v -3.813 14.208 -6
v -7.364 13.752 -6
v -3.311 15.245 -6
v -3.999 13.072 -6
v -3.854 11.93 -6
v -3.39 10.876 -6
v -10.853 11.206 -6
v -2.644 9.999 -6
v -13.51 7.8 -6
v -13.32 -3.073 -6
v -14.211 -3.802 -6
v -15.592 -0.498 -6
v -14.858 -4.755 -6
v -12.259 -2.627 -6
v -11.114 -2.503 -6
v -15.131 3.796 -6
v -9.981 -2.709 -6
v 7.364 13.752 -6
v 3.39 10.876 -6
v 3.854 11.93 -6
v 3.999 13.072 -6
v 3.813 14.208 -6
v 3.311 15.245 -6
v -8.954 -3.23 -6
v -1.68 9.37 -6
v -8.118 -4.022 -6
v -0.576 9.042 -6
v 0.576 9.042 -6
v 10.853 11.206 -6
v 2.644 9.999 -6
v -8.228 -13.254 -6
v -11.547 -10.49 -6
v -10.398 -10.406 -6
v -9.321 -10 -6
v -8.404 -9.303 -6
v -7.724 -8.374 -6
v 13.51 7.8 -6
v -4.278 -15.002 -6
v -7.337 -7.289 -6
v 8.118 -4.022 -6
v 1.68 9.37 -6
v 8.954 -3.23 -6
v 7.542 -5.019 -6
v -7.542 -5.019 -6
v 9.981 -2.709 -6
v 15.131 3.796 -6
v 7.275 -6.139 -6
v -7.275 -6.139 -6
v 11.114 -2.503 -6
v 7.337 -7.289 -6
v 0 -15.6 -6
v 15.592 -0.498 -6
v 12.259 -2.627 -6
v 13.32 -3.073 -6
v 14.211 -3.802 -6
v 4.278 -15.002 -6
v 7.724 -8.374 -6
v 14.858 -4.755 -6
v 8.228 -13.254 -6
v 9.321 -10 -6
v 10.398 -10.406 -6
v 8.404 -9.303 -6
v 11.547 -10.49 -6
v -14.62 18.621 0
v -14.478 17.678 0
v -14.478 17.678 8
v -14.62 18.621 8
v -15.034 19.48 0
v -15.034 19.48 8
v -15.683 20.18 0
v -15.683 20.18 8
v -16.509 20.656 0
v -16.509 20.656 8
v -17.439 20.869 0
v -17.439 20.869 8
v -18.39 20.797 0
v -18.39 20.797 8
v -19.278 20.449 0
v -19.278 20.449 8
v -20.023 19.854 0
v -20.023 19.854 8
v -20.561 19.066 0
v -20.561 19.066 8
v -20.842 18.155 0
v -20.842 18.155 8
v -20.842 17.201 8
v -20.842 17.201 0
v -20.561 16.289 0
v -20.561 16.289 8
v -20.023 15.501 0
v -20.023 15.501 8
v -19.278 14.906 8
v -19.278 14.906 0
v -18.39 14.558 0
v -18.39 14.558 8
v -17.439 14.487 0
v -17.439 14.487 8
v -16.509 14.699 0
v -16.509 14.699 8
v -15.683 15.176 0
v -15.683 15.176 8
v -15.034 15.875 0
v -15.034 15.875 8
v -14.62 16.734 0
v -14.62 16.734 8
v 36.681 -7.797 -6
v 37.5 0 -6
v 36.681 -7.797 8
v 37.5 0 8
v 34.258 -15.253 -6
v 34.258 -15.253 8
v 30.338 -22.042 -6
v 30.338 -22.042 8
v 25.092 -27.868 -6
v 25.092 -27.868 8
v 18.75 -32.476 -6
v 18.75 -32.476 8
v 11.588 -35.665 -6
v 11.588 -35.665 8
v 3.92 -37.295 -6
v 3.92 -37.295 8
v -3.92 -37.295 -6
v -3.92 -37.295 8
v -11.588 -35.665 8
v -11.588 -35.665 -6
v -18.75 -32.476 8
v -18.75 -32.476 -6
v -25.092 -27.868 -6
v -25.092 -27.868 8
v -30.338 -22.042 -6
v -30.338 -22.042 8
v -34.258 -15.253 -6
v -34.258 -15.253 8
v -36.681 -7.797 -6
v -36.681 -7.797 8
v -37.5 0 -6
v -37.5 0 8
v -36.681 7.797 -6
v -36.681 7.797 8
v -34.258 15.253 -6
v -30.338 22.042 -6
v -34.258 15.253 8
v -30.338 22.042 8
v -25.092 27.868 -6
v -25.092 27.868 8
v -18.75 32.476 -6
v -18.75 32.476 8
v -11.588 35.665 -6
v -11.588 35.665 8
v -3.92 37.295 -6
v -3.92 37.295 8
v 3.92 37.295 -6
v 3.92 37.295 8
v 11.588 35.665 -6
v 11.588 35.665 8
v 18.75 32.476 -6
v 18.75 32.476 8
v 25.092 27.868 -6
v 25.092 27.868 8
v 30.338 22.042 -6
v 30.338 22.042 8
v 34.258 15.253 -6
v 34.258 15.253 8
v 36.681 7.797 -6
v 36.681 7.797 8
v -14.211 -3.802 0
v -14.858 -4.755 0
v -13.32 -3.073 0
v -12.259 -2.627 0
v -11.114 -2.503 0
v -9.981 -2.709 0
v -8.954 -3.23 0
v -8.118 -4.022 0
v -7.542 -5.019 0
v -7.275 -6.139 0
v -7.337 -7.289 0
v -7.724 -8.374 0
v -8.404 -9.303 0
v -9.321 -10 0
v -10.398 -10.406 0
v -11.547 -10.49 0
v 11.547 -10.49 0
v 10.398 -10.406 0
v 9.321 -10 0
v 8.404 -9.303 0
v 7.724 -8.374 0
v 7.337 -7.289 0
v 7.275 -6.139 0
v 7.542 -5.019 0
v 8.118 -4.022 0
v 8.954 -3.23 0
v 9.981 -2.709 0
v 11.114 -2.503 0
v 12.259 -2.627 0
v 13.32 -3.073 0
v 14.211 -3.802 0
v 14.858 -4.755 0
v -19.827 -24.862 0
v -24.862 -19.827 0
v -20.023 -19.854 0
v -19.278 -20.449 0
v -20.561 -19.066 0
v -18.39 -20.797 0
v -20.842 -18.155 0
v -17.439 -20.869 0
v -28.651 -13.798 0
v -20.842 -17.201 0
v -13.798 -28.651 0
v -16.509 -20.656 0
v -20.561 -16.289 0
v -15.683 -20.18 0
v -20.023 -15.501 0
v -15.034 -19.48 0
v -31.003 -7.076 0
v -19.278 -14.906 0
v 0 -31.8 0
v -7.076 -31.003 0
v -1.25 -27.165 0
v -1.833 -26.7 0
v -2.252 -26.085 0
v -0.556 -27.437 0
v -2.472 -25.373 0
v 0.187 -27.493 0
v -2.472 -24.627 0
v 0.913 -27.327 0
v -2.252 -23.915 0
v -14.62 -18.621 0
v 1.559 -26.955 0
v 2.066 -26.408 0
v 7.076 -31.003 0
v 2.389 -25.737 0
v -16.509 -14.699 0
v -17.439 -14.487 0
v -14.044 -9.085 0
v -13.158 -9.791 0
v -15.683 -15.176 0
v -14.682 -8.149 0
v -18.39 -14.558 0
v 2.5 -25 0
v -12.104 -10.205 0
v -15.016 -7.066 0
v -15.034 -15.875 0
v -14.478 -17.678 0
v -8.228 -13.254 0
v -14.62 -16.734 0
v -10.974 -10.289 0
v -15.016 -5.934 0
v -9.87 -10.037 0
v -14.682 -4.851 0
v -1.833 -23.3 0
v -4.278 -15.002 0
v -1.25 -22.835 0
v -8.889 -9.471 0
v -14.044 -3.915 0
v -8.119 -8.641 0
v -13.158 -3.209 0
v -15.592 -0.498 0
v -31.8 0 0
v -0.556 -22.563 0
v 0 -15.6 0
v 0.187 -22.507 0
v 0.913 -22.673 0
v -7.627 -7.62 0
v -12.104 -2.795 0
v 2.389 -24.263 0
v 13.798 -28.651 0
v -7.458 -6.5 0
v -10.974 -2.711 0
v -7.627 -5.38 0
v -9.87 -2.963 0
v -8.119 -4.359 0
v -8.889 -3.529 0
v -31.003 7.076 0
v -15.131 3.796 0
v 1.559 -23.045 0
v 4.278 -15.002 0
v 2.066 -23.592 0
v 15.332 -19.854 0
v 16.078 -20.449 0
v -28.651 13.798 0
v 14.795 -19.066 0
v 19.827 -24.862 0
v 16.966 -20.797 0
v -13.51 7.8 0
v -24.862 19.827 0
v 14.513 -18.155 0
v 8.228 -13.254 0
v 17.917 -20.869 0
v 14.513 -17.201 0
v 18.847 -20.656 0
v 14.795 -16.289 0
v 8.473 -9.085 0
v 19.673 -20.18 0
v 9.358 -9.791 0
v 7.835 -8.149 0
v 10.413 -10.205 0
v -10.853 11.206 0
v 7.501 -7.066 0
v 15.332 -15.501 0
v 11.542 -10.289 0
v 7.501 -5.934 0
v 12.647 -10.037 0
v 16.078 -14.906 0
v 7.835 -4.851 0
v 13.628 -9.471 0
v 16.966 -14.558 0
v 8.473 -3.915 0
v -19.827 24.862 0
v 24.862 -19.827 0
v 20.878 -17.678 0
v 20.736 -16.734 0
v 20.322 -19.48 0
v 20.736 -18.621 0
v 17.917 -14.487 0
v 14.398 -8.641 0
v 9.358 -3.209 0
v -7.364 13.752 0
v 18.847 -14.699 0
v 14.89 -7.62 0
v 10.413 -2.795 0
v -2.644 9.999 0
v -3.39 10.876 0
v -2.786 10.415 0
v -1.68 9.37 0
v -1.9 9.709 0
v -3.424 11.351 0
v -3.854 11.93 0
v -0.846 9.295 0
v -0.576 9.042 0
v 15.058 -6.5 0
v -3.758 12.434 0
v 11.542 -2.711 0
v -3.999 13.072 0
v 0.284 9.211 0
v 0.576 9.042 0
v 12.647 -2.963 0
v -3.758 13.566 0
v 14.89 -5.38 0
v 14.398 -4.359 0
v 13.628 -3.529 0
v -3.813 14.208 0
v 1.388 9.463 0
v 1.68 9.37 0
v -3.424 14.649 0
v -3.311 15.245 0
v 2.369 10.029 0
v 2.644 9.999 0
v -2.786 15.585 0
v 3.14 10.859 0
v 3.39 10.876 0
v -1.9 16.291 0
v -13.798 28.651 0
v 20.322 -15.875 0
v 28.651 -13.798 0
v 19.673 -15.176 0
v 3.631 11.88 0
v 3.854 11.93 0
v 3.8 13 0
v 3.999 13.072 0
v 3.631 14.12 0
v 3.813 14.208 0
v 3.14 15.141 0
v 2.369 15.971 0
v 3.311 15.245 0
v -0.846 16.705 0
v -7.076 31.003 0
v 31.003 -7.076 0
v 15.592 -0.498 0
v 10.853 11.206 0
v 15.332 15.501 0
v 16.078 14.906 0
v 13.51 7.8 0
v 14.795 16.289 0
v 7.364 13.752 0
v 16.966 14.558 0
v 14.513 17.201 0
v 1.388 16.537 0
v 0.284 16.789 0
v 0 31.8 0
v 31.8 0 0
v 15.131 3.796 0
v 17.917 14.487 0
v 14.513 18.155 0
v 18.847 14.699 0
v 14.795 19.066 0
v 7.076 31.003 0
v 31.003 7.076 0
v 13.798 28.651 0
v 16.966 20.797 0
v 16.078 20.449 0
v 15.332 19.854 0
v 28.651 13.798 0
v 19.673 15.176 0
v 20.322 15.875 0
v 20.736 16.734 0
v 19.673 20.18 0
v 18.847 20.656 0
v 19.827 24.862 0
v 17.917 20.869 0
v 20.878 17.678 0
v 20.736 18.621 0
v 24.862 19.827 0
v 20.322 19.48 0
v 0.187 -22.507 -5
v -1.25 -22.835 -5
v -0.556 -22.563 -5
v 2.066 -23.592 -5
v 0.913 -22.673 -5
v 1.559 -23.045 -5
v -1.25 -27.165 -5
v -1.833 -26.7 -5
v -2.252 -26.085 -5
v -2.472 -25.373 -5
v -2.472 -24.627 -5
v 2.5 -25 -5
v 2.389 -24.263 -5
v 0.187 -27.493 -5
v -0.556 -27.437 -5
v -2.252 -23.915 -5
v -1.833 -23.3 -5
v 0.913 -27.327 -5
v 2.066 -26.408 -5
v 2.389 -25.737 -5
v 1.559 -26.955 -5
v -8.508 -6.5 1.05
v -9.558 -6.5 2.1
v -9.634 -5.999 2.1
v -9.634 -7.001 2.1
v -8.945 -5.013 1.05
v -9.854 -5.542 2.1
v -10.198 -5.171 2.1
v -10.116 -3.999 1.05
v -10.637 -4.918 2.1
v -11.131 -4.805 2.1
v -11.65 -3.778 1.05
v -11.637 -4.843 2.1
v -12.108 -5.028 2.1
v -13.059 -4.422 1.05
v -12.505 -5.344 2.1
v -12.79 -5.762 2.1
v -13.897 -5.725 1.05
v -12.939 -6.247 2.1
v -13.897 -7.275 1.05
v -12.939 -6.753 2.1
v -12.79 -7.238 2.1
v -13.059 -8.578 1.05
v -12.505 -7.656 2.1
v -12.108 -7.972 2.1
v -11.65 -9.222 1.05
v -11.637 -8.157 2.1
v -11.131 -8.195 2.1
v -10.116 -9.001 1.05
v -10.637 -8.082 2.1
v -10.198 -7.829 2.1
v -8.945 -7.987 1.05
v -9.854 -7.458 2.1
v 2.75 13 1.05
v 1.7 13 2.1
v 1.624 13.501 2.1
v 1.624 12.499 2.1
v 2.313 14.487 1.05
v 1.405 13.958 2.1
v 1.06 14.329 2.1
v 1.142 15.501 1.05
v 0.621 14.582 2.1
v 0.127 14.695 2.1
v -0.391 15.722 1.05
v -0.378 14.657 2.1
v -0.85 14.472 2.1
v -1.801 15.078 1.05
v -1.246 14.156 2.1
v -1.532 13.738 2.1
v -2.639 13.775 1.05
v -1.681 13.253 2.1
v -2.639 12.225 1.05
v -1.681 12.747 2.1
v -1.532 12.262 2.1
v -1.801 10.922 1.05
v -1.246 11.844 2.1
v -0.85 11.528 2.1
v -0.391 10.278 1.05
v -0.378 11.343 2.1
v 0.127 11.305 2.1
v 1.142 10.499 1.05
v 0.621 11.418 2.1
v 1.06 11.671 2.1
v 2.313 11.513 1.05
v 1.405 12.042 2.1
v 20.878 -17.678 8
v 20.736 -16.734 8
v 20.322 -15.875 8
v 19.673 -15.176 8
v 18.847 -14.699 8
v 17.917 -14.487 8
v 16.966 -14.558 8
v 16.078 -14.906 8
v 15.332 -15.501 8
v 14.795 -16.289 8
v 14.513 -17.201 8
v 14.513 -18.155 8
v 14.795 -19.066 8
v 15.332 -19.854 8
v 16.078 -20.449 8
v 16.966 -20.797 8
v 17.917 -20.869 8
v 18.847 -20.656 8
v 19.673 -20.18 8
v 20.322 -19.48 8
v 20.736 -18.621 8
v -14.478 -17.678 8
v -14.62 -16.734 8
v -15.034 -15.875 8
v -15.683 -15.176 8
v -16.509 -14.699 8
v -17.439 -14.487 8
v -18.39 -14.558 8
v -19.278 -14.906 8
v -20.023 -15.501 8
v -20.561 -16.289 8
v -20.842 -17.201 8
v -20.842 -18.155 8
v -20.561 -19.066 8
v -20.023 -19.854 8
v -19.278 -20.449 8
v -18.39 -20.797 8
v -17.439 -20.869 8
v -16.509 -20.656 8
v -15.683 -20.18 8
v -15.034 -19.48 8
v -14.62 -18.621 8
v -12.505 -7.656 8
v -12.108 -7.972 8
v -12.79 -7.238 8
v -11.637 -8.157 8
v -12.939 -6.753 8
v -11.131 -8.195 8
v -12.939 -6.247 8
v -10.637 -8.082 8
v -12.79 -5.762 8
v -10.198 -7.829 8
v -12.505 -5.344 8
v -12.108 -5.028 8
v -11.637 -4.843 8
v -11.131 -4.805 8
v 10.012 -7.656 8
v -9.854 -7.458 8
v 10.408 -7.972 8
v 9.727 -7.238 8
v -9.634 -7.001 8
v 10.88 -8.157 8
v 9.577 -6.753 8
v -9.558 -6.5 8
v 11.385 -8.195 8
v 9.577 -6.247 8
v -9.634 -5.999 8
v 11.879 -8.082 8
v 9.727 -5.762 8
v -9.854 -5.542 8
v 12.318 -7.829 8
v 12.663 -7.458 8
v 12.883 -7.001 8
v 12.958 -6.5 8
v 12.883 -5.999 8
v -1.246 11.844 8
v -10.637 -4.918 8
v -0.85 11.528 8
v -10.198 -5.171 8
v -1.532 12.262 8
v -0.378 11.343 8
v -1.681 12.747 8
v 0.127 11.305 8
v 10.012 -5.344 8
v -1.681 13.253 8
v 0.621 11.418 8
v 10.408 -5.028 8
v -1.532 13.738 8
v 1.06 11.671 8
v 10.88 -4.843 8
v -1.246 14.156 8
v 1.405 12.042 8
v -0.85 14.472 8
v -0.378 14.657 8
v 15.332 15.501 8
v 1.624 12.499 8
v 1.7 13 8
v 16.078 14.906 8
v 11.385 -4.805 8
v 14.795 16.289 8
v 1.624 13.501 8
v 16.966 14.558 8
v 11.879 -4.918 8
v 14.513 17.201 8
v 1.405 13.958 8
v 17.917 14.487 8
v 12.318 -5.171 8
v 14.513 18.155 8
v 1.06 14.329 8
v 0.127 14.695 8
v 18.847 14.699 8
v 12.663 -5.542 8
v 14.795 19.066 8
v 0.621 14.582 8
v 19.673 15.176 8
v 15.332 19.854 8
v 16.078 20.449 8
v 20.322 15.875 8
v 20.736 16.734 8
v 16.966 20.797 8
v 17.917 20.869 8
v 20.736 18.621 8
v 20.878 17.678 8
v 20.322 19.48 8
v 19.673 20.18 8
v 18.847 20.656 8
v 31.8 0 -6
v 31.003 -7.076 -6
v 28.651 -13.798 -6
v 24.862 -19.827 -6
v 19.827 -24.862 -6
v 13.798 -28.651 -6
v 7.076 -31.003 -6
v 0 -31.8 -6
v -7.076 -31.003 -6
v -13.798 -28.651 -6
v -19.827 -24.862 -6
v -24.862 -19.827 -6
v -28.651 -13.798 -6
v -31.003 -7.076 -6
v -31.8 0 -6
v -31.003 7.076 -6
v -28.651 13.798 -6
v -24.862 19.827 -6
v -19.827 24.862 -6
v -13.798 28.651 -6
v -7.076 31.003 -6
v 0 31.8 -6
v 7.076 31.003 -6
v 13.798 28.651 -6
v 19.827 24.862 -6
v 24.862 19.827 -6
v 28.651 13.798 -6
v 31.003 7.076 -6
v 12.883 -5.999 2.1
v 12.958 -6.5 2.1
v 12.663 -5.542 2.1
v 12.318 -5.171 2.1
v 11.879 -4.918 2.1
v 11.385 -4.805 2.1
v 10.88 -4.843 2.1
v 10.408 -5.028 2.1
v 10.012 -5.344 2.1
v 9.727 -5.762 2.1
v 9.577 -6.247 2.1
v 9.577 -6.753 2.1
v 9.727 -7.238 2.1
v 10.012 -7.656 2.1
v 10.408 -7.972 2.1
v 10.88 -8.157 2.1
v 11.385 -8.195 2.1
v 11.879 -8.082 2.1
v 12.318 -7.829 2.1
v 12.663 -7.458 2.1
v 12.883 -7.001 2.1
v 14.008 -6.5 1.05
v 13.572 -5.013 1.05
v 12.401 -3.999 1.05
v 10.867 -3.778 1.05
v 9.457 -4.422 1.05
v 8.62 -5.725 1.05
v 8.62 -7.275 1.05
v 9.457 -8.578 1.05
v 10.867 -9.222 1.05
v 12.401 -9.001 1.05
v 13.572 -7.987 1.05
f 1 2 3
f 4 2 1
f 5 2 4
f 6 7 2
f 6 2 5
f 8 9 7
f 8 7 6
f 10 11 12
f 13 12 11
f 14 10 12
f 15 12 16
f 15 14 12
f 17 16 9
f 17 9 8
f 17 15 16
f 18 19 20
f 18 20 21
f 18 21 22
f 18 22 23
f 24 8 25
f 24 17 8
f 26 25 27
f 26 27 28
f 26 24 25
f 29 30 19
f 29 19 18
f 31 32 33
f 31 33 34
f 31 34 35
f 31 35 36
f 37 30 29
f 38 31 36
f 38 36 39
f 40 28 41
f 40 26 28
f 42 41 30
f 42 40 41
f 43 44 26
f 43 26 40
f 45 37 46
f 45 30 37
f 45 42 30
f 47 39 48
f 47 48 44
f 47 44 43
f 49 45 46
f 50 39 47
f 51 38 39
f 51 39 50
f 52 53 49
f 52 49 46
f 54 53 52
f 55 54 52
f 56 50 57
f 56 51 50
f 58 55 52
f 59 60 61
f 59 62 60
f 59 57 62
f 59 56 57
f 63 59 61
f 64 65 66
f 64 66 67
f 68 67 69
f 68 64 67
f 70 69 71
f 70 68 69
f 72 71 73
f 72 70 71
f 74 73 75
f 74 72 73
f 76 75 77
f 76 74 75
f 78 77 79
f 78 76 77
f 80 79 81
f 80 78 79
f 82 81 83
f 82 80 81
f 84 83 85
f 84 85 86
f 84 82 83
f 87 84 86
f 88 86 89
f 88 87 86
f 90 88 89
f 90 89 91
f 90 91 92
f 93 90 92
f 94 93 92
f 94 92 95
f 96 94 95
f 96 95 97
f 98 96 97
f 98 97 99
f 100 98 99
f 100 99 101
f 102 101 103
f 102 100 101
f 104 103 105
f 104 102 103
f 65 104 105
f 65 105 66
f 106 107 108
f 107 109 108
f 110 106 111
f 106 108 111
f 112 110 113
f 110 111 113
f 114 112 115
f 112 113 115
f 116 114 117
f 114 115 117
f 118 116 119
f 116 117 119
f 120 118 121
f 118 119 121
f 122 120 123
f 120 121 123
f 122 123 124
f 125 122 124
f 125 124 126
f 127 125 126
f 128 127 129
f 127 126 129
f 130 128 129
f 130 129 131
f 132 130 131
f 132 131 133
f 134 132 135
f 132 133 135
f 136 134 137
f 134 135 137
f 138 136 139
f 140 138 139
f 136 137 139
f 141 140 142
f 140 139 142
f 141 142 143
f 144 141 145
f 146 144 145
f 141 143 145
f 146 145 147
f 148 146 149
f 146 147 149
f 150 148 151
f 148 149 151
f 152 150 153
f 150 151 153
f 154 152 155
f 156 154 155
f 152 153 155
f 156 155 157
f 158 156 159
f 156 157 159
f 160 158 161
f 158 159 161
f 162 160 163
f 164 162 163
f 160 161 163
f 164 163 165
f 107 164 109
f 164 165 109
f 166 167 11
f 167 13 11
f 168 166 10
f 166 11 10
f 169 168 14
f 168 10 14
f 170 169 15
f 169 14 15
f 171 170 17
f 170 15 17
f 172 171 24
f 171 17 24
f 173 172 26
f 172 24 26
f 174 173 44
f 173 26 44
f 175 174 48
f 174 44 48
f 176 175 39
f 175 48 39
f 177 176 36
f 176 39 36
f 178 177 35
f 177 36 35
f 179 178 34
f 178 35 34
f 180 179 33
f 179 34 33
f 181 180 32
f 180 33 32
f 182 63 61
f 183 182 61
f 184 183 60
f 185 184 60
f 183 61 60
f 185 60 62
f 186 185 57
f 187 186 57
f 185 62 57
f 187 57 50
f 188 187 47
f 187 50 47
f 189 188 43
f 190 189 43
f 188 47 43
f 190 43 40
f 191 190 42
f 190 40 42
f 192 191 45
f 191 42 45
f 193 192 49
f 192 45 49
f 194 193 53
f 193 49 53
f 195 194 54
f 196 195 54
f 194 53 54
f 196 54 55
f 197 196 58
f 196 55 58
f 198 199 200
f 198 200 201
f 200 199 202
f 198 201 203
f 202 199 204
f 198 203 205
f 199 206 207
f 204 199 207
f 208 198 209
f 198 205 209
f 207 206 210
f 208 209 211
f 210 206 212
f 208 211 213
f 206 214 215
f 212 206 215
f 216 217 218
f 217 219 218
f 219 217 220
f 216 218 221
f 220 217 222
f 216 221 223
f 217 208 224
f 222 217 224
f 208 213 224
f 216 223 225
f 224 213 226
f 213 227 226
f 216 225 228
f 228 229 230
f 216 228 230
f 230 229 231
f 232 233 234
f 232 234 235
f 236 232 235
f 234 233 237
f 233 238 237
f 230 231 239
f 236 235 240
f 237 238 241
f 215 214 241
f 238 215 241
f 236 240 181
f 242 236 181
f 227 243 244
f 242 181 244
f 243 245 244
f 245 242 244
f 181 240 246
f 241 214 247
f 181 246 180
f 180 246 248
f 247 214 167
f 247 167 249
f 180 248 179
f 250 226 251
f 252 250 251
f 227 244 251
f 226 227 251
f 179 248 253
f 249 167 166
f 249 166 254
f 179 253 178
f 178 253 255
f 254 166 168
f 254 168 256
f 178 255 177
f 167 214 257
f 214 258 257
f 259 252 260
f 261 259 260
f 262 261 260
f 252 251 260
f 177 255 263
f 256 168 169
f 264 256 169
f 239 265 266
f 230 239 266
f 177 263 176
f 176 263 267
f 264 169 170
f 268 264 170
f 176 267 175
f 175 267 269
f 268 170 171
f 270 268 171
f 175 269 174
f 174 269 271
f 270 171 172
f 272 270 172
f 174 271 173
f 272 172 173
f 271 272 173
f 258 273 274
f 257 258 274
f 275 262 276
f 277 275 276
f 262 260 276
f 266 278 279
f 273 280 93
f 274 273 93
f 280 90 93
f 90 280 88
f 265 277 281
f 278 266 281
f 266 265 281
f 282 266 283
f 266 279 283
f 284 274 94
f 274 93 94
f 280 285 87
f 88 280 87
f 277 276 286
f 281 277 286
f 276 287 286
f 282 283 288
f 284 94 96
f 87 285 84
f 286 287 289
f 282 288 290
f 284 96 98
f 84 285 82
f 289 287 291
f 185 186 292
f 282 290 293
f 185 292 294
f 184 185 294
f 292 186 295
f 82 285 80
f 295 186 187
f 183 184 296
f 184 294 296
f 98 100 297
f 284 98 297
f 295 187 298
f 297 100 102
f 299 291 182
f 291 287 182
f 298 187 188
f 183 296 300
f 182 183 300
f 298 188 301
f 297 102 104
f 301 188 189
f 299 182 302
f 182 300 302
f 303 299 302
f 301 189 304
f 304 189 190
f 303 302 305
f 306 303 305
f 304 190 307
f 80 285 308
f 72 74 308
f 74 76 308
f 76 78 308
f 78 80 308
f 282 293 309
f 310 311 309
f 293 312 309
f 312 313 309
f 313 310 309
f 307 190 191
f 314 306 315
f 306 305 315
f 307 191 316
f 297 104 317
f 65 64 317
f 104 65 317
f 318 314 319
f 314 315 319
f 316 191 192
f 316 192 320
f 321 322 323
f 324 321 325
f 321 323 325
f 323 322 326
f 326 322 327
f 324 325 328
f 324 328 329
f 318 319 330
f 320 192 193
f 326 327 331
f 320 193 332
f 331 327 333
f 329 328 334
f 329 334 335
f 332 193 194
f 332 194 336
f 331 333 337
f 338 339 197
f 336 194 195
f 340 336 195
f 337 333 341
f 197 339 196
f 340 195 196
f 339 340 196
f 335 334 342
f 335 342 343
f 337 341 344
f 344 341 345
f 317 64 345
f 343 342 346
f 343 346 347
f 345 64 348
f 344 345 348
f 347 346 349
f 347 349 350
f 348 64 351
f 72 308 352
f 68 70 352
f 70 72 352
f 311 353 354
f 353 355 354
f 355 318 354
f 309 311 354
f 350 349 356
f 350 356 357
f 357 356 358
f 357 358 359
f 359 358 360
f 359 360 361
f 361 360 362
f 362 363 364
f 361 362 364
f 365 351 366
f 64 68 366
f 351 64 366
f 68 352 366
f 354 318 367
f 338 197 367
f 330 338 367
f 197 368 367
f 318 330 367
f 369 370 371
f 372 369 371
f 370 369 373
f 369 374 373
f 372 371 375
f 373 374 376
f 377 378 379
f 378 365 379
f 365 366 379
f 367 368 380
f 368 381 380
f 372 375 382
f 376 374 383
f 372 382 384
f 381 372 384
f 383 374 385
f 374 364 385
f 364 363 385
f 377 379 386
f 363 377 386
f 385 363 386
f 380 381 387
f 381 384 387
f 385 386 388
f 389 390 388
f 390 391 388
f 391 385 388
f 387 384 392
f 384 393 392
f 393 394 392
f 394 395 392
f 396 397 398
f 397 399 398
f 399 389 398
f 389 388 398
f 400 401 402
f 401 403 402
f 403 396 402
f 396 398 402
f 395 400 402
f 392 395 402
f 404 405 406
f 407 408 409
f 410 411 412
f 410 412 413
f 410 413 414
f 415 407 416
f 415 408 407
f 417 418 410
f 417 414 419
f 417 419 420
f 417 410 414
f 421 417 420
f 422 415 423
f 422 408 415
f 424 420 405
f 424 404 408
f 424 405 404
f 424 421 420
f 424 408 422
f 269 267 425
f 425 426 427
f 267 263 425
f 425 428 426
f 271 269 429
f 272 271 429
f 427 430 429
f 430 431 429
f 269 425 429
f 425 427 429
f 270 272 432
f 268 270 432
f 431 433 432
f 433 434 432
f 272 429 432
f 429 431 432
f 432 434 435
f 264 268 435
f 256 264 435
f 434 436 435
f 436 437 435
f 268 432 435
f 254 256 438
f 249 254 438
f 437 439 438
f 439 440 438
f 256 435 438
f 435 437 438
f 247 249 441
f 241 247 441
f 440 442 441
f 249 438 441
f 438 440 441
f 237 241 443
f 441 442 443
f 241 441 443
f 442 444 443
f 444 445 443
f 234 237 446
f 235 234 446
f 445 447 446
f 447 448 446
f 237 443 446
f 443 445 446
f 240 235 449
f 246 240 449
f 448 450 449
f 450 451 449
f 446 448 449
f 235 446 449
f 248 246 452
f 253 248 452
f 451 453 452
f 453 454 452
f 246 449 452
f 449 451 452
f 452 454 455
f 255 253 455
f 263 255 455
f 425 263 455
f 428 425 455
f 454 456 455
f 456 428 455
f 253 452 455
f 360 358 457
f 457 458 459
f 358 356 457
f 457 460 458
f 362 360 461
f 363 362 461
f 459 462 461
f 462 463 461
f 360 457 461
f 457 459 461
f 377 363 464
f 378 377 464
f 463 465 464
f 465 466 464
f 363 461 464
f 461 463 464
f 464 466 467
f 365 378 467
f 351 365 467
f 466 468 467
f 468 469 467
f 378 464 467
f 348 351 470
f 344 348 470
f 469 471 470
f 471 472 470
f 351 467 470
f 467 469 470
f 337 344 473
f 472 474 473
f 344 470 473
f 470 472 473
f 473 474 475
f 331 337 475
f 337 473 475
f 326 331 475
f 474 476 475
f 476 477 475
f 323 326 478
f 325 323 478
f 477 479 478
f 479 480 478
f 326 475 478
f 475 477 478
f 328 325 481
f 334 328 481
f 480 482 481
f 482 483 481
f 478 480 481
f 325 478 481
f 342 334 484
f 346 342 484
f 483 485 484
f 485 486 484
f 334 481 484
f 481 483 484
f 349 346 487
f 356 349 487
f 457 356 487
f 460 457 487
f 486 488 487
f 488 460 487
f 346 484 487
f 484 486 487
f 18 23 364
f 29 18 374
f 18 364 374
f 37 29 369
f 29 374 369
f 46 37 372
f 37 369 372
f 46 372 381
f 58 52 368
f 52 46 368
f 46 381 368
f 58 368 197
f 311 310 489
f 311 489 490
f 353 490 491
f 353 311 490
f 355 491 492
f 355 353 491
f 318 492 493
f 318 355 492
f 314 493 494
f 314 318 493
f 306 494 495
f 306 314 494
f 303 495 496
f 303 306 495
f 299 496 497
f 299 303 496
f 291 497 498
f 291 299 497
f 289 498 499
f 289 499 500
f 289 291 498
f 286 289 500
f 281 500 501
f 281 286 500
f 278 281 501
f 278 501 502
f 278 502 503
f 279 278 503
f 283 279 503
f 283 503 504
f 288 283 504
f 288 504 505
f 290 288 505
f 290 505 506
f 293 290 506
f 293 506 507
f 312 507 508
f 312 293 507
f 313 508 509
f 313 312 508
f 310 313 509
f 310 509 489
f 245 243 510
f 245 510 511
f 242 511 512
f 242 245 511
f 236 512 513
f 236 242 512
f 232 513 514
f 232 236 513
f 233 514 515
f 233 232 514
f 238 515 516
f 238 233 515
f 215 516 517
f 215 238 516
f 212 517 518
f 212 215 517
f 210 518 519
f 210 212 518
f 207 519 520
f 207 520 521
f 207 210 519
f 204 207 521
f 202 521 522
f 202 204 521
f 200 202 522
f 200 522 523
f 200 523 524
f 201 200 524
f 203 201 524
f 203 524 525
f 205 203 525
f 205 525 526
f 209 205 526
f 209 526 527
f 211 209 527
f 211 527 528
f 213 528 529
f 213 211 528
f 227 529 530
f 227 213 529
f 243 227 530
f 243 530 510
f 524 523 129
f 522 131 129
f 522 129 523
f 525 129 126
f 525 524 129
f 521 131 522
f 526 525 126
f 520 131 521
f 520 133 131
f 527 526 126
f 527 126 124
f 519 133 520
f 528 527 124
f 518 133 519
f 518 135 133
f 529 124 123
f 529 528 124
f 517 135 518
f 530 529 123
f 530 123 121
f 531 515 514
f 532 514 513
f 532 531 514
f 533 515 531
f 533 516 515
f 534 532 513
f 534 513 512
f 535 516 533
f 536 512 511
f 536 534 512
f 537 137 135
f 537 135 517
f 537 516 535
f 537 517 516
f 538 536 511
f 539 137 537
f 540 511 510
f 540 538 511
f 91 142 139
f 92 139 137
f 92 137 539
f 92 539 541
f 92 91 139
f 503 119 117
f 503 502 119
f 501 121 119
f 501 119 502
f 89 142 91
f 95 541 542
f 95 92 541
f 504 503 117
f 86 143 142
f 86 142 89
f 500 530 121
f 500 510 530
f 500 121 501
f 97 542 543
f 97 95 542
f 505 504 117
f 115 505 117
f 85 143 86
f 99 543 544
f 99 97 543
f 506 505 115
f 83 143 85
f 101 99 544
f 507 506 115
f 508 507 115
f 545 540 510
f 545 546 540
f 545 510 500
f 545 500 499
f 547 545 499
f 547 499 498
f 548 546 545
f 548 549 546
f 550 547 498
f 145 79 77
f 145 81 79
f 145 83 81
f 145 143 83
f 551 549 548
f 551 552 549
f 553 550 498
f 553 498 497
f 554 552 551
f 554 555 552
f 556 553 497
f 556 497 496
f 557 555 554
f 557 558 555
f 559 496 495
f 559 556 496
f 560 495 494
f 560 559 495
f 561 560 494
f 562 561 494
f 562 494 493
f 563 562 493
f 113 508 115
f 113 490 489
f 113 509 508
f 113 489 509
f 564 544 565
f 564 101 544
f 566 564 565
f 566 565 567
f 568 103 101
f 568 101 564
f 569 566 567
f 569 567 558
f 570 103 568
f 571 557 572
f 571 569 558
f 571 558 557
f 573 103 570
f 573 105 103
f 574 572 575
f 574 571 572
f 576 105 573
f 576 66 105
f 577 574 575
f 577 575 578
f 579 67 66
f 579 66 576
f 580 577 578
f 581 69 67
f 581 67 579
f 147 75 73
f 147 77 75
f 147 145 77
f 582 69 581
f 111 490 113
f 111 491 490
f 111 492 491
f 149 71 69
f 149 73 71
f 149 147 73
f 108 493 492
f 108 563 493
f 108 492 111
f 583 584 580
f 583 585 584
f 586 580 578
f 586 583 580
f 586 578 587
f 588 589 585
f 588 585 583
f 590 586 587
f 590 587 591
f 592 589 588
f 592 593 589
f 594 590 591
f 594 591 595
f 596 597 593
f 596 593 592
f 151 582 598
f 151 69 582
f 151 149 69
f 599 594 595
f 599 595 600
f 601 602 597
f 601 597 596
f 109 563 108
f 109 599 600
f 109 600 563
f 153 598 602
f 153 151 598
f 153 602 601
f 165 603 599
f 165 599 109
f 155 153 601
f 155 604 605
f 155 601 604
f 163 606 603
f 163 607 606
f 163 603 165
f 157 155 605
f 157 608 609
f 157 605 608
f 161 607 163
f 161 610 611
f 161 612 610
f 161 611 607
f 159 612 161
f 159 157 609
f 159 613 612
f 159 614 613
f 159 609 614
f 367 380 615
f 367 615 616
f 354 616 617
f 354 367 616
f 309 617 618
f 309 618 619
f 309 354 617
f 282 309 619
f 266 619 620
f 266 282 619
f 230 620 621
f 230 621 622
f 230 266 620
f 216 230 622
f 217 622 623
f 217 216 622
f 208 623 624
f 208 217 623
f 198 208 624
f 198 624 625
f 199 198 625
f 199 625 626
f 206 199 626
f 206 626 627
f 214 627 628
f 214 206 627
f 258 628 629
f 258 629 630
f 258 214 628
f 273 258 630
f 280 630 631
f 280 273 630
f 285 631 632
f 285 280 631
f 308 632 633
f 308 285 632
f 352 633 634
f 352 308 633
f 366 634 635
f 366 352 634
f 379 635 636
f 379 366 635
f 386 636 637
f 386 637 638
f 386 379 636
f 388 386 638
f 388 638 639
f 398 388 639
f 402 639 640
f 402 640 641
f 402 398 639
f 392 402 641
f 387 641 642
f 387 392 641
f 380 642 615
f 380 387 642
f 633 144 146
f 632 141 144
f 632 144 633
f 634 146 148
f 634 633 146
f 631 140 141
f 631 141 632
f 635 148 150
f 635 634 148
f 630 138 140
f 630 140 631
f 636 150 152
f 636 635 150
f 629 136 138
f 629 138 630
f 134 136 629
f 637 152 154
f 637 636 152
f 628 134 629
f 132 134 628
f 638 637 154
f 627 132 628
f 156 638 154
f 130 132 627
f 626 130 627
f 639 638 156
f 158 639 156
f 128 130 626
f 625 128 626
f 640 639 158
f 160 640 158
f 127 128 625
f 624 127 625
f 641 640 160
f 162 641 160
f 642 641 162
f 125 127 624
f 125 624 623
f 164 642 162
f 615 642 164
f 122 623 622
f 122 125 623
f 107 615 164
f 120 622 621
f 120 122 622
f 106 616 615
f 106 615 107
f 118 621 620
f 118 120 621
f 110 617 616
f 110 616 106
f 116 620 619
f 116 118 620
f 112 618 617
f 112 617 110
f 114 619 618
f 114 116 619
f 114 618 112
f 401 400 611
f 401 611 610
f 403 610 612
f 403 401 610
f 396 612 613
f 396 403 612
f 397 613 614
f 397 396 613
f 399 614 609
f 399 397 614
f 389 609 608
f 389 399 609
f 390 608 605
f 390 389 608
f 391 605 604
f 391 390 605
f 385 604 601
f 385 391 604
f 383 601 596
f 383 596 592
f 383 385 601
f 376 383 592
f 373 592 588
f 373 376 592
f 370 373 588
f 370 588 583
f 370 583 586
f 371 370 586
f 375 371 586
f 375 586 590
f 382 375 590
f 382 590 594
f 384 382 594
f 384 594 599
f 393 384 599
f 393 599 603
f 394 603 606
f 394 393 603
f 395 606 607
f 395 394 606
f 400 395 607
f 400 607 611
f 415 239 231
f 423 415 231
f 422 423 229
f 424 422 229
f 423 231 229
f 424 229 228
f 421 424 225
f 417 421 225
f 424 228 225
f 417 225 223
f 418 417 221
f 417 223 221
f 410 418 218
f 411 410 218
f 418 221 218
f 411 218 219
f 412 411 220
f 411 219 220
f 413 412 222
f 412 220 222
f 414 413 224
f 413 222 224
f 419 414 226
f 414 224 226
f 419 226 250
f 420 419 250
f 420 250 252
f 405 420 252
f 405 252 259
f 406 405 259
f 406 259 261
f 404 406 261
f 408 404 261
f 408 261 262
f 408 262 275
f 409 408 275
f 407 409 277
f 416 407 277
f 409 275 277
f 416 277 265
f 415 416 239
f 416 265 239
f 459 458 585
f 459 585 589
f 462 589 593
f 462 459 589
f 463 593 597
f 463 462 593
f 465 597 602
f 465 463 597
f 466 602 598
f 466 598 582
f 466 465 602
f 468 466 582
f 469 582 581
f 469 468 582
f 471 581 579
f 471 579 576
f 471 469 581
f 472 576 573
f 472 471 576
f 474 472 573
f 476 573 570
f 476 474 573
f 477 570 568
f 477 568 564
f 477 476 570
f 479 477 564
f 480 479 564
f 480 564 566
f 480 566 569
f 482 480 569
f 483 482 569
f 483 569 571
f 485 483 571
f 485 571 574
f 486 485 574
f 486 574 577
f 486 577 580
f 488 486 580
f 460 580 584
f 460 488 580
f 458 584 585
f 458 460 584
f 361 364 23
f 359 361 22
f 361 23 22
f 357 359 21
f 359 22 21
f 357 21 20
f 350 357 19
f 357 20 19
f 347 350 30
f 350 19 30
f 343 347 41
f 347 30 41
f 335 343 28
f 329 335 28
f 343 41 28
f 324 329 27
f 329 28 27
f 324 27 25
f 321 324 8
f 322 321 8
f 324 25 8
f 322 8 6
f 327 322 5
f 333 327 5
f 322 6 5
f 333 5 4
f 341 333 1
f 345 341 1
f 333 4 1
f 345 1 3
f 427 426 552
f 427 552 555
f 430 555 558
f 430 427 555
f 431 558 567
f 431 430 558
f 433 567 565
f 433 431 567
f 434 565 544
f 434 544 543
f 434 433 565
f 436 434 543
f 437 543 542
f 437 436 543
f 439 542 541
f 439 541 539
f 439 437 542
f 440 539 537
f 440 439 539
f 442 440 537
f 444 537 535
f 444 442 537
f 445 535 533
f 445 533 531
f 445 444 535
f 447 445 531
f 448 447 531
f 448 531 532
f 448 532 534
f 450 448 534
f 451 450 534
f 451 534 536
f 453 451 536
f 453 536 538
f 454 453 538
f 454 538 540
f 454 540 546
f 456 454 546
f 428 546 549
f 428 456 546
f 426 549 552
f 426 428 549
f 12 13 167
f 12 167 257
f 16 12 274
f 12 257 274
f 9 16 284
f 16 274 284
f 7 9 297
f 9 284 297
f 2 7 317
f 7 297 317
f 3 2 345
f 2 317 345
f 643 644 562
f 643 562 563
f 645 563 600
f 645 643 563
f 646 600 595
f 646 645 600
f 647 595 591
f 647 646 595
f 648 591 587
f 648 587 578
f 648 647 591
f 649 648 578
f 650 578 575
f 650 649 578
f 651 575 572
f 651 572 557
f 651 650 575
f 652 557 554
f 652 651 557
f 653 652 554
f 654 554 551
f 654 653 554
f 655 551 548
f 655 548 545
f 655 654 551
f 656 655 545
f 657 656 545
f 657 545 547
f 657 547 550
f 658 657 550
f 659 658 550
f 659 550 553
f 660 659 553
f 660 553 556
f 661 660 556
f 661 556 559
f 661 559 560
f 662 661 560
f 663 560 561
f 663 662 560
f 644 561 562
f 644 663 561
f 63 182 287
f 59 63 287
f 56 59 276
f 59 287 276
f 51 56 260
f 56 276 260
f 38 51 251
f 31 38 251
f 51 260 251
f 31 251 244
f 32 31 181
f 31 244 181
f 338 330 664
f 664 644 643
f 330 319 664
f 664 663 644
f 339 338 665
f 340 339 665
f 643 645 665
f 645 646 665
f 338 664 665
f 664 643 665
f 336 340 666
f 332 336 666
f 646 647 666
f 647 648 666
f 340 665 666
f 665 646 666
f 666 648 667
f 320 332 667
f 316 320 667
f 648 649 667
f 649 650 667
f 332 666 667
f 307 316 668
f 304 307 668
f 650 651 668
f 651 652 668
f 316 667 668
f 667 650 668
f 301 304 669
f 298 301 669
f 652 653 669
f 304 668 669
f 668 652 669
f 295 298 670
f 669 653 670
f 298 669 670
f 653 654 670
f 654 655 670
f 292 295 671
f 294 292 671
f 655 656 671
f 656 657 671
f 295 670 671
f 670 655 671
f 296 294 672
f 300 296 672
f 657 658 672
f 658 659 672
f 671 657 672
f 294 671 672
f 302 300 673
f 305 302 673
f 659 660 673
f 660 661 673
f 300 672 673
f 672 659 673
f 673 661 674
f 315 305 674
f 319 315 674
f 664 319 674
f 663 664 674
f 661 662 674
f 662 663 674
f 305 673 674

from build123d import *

# Parameters (mm, degrees)
SKETCH_R        = 37.5
SKETCH_R_2      = 1.7
SKETCH_R_3      = 3.2
PAD_DEPTH       = 8
SKETCH001_R     = 37.5
SKETCH001_R_2   = 31.8
PAD001_DEPTH    = 6
SKETCH002_R     = 2.5
PAD002_DEPTH    = 5
SKETCH003_R     = 15.6
PAD003_DEPTH    = 6
SKETCH004_R     = 4
POCKET_DEPTH    = 6
CHAMFER_SIZE    = 2.1
CHAMFER001_SIZE = 2.1
CHAMFER002_SIZE = 2.1


with BuildPart() as part:
    # Sketch → Pad (new body)
    with BuildSketch(Plane.XY):
        Circle(SKETCH_R)
        with Locations((-11.25833, -6.5)):
            Circle(SKETCH_R_2, mode=Mode.SUBTRACT)
        with Locations((11.25833, -6.5)):
            Circle(SKETCH_R_2, mode=Mode.SUBTRACT)
        with Locations((0, 13)):
            Circle(SKETCH_R_2, mode=Mode.SUBTRACT)
        with Locations((-17.67767, 17.67767)):
            Circle(SKETCH_R_3, mode=Mode.SUBTRACT)
        with Locations((17.67767, 17.67767)):
            Circle(SKETCH_R_3, mode=Mode.SUBTRACT)
        with Locations((-17.67767, -17.67767)):
            Circle(SKETCH_R_3, mode=Mode.SUBTRACT)
        with Locations((17.67767, -17.67767)):
            Circle(SKETCH_R_3, mode=Mode.SUBTRACT)
    extrude(amount=PAD_DEPTH)

    # Sketch001 → Pad001 (new body)
    with BuildSketch(Plane(origin=(0, 0, 0), x_dir=(1, 0, 0), z_dir=(0, 0, -1))):
        Circle(SKETCH001_R)
        Circle(SKETCH001_R_2, mode=Mode.SUBTRACT)
    extrude(amount=PAD001_DEPTH)

    # Sketch002 → Pad002 (new body)
    with BuildSketch(Plane(origin=(0, 0, 0), x_dir=(1, 0, 0), z_dir=(0, 0, -1))):
        with Locations((0, 25)):
            Circle(SKETCH002_R)
    extrude(amount=PAD002_DEPTH)

    # Sketch003 → Pad003 (new body)
    with BuildSketch(Plane(origin=(0, 0, 0), x_dir=(1, 0, 0), z_dir=(0, 0, -1))):
        Circle(SKETCH003_R)
    extrude(amount=PAD003_DEPTH)

    # Sketch004 → Pocket (cut)
    with BuildSketch(Plane(origin=(0, 0, -6), x_dir=(1, 0, 0), z_dir=(0, 0, -1))):
        with Locations((-11.25833, 6.5)):
            Circle(SKETCH004_R)
        with Locations((11.25833, 6.5)):
            Circle(SKETCH004_R)
        with Locations((0, -13)):
            Circle(SKETCH004_R)
    extrude(amount=-POCKET_DEPTH, mode=Mode.SUBTRACT)

    # Chamfer
    chamfer_edges = [part.edges().sort_by_distance(p)[0] for p in [
        (9.55833, -6.5, 0),
    ]]
    chamfer(chamfer_edges, length=CHAMFER_SIZE)

    # Chamfer001
    chamfer001_edges = [part.edges().sort_by_distance(p)[0] for p in [
        (-12.95833, -6.5, 0),
    ]]
    chamfer(chamfer001_edges, length=CHAMFER001_SIZE)

    # Chamfer002
    chamfer002_edges = [part.edges().sort_by_distance(p)[0] for p in [
        (-1.7, 13, 0),
    ]]
    chamfer(chamfer002_edges, length=CHAMFER002_SIZE)


solid = part.part
